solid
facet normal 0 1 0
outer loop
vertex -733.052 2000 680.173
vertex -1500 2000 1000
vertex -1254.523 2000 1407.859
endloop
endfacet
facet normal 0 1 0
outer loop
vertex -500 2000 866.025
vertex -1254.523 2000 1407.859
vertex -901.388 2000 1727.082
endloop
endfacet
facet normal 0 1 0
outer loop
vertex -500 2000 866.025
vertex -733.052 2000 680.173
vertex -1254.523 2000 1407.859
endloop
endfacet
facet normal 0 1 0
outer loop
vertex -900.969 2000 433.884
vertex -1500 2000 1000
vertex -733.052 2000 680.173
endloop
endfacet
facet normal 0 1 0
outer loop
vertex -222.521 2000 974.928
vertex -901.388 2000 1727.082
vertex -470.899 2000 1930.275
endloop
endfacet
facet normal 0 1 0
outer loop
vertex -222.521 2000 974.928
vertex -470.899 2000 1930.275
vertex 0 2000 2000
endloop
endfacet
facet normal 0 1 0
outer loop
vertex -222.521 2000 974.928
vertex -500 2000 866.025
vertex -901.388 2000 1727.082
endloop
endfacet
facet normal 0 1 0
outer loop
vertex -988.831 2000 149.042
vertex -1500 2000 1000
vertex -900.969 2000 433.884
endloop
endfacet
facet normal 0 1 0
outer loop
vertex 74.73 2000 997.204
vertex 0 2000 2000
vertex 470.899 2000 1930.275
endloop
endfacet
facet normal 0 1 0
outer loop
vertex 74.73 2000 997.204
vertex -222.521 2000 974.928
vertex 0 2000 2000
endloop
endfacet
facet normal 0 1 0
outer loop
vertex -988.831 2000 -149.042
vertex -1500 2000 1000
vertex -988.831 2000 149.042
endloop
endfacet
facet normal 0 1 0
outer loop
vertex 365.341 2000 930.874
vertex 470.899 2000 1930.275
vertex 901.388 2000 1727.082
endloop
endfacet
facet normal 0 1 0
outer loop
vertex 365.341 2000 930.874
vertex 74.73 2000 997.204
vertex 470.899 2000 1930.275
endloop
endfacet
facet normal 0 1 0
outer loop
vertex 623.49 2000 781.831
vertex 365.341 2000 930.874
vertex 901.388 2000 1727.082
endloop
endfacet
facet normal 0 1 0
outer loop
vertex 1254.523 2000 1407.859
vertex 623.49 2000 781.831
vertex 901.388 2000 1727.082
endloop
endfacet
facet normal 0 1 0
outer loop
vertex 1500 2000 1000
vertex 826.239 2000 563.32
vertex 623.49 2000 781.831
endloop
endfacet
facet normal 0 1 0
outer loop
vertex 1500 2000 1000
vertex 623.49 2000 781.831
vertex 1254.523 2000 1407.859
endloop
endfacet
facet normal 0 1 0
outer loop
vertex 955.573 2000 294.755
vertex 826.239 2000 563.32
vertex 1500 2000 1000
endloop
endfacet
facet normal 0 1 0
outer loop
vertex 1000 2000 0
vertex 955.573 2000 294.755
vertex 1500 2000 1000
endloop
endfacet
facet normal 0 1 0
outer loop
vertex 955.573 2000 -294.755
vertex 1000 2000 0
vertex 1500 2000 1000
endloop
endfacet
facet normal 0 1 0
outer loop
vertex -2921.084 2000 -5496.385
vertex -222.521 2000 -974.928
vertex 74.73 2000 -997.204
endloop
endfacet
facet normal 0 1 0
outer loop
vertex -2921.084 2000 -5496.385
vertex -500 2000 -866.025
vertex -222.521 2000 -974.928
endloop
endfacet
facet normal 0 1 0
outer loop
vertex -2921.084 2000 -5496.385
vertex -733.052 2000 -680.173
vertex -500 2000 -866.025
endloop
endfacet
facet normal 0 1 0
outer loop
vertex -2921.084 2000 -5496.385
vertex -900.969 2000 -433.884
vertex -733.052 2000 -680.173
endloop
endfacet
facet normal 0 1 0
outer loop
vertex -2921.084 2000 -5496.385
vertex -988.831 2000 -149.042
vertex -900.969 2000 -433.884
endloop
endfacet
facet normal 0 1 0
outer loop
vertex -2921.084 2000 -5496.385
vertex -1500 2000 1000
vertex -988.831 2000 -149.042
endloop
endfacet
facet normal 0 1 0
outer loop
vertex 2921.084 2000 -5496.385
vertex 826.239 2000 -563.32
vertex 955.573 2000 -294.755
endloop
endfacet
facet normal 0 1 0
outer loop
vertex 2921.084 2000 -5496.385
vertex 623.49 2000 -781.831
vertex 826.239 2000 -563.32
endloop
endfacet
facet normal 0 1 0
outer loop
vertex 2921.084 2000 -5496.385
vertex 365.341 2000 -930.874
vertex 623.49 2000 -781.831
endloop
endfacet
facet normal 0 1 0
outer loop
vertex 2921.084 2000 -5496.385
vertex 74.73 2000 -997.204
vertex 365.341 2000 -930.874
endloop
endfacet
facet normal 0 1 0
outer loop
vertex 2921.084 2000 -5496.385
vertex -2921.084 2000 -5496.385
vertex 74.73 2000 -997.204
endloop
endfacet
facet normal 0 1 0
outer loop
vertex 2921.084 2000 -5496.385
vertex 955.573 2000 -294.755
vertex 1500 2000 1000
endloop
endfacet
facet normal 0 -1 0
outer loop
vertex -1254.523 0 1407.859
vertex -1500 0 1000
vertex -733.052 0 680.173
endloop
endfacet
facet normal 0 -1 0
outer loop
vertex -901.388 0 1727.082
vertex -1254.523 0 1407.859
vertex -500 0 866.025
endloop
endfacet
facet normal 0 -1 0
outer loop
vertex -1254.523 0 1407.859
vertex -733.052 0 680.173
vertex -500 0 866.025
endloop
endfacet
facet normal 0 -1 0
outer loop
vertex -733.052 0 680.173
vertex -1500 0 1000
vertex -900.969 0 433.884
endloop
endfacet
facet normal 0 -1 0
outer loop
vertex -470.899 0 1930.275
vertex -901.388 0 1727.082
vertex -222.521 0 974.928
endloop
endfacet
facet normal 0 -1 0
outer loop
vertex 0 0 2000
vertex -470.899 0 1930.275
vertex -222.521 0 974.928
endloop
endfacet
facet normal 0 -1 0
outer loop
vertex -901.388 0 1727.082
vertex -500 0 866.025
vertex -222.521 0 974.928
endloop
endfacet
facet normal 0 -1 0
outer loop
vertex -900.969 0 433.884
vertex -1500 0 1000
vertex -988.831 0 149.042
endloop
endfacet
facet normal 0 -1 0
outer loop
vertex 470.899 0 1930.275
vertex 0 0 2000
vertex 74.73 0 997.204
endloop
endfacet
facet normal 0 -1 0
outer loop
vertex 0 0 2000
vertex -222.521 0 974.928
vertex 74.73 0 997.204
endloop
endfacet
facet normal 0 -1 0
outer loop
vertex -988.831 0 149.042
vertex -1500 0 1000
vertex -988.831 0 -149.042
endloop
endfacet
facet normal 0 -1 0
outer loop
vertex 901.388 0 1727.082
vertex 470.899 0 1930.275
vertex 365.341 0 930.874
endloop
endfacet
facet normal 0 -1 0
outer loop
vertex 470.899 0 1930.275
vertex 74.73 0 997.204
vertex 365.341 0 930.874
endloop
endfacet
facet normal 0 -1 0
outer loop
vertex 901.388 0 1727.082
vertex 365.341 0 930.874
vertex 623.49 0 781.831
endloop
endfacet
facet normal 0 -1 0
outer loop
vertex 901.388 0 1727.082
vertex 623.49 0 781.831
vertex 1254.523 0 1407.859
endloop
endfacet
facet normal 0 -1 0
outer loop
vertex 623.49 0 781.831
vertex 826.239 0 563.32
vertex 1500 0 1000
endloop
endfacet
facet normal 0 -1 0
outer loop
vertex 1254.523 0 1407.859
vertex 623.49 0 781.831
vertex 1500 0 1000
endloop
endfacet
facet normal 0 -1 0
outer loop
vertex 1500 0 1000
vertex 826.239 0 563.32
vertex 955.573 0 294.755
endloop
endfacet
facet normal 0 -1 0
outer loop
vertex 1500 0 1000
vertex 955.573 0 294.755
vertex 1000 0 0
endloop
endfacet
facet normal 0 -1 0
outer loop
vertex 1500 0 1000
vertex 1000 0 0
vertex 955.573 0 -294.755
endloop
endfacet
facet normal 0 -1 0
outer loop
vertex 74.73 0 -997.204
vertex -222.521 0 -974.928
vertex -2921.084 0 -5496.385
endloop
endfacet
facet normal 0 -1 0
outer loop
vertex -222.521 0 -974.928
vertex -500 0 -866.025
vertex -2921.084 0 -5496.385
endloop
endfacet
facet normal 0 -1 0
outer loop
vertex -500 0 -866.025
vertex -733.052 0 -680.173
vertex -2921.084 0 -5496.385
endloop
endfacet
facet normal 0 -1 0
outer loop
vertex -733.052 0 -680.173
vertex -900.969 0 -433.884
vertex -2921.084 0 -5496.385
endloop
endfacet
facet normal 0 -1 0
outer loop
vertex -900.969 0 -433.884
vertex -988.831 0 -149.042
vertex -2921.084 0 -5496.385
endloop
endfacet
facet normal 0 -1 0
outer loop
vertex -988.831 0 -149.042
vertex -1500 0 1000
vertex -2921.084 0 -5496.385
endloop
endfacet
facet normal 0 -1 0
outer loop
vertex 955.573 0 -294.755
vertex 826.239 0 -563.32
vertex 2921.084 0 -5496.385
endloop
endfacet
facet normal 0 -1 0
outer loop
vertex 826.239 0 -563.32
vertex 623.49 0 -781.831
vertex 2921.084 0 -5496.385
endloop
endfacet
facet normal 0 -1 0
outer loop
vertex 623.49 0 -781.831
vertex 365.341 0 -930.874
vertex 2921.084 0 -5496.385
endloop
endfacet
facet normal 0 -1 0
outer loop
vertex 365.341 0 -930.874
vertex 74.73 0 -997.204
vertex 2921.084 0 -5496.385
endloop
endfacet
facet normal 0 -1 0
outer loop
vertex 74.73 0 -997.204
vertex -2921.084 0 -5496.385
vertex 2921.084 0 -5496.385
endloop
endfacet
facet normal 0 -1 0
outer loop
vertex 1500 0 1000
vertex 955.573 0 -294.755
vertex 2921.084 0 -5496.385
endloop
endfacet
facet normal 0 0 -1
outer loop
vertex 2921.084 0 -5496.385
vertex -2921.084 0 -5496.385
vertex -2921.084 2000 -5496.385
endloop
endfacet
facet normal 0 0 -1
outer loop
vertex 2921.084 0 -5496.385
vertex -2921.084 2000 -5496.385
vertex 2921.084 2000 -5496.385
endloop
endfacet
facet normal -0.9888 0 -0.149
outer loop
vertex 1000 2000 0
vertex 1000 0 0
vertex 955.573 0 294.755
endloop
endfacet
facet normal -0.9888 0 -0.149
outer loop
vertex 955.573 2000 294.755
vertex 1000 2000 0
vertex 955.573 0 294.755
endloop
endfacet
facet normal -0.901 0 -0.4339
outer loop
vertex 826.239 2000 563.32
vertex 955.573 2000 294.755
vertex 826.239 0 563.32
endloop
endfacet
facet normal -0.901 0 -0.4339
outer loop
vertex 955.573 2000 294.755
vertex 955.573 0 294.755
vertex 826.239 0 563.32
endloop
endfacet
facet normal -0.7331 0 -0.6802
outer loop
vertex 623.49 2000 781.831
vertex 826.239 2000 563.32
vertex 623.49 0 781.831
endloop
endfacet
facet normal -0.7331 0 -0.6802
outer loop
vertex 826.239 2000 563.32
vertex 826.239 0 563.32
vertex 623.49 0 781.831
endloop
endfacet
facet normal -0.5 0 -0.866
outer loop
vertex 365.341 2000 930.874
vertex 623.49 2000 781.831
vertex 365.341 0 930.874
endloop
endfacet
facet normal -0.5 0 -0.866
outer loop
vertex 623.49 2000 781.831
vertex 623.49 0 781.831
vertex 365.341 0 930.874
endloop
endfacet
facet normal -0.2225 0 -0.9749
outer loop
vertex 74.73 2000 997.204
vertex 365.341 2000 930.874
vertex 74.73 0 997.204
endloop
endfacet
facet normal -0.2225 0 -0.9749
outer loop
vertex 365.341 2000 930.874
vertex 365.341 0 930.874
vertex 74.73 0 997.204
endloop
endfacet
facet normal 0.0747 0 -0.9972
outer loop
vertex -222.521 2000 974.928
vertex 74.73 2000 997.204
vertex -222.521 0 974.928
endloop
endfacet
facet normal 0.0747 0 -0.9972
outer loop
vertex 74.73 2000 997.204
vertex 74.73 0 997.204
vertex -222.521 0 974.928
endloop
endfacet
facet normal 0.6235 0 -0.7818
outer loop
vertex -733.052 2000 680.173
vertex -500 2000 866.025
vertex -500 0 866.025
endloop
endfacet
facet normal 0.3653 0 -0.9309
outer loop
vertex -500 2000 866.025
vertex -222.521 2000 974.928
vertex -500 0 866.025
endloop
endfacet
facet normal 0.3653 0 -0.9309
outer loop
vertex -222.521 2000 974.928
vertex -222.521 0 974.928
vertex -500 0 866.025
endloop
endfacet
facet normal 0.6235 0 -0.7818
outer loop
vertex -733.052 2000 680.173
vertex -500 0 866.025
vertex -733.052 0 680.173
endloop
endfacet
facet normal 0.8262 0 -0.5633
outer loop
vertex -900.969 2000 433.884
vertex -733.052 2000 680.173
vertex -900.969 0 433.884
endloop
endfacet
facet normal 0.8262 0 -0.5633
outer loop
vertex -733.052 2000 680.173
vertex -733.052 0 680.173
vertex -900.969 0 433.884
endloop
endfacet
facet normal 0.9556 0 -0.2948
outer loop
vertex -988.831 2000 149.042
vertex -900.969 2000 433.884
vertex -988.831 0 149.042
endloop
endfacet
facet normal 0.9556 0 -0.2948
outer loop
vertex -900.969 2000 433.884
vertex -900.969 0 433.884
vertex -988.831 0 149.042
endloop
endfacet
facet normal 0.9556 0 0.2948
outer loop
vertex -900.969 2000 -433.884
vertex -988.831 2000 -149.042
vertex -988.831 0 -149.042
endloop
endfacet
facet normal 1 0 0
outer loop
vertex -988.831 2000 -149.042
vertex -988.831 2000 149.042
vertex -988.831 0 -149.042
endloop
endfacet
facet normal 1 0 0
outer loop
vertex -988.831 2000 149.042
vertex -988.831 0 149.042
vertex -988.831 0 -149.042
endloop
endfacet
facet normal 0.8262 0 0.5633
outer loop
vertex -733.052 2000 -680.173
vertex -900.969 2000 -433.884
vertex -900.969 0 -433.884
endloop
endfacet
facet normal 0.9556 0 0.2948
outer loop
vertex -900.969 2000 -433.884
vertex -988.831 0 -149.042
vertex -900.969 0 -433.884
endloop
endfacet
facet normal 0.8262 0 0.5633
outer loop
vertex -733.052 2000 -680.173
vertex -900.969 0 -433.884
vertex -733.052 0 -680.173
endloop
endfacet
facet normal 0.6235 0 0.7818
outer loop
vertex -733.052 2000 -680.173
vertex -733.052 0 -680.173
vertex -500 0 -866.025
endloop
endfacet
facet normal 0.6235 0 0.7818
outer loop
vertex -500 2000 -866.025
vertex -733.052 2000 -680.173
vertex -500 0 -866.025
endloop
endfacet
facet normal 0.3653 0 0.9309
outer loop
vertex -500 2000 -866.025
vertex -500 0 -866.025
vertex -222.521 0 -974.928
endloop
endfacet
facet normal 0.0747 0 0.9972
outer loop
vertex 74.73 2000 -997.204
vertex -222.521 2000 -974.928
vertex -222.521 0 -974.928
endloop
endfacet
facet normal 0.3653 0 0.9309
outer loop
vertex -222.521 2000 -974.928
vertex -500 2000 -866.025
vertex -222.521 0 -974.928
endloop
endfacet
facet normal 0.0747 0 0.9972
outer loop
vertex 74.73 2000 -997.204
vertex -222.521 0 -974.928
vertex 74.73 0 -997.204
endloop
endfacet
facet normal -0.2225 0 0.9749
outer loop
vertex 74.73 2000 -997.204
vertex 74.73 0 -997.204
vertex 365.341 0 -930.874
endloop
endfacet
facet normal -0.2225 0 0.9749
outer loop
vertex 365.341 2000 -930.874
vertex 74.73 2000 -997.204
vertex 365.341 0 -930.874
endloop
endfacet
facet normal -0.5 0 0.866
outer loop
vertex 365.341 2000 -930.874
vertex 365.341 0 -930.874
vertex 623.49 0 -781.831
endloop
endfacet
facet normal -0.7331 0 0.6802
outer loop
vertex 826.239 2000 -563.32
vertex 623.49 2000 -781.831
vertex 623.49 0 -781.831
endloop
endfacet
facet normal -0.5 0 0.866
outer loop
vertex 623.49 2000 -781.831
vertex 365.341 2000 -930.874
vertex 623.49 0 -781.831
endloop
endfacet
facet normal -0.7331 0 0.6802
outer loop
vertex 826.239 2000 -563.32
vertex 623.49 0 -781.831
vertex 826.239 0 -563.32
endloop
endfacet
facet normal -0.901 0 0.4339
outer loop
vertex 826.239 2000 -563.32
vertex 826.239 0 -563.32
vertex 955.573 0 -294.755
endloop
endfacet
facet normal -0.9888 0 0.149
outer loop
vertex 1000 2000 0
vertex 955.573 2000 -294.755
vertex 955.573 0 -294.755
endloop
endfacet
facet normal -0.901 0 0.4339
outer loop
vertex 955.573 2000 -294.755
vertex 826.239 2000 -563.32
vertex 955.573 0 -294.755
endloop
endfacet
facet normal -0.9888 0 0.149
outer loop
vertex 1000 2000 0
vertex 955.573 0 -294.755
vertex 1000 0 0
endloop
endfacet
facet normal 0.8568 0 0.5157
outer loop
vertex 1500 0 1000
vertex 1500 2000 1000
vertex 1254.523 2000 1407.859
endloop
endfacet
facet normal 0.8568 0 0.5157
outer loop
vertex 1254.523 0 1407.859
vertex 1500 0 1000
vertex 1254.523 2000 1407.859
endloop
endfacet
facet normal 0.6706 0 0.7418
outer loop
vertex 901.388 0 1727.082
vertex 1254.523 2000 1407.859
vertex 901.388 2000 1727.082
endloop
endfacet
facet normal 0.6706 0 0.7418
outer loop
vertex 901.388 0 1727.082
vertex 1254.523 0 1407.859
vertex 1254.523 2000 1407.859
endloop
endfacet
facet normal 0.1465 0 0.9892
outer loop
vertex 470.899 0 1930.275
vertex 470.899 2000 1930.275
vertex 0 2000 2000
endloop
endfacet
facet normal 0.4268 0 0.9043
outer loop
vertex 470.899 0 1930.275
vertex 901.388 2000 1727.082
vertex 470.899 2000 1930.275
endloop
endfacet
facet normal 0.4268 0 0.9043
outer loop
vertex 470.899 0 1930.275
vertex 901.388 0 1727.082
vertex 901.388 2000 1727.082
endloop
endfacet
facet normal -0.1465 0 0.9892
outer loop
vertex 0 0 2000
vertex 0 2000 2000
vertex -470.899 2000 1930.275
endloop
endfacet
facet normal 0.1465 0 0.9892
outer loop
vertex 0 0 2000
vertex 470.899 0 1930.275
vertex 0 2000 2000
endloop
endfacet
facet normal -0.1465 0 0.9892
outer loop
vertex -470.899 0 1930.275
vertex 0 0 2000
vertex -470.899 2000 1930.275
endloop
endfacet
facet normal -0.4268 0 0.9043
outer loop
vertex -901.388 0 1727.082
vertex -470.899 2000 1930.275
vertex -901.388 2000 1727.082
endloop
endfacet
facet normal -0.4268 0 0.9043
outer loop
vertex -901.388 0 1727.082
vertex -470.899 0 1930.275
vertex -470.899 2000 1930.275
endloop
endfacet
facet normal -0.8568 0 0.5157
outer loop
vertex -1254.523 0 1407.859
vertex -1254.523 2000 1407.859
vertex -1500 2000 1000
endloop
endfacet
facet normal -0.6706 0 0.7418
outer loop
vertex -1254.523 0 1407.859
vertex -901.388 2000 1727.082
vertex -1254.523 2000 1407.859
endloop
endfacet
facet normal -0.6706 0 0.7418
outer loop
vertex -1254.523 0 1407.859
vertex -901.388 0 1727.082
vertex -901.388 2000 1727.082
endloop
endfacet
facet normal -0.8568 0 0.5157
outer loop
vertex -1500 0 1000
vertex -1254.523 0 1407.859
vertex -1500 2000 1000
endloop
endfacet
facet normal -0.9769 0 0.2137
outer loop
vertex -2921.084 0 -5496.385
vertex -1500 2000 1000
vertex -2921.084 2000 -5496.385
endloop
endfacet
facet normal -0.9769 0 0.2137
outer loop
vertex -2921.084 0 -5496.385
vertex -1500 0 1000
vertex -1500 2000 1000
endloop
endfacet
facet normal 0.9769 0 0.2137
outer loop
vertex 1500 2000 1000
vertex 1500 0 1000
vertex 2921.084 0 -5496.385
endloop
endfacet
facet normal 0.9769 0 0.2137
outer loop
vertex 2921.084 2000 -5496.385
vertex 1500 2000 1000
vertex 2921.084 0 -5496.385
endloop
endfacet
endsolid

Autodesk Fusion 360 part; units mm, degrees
sketch "Sketch1" plane through (0, 0, 0) normal (0, 1, 0) x (1, 0, 0)
  circle A0 centre (0, 0) radius 1000
  arc A1 (-1500, -1000) -> (1500, -1000) centre (0, -375) ccw
  line L0 (-1500, -1000) -> (-2921.0842, 5496.3851)
  line L1 (0, -2600) -> (0, 5800) construction
  line L2 (1500, -1000) -> (2921.0842, 5496.3851)
  line L3 (-2921.0842, 5496.3851) -> (2921.0842, 5496.3851)
extrude "Extrude1" add sketch "Sketch1" along normal blind 2000
